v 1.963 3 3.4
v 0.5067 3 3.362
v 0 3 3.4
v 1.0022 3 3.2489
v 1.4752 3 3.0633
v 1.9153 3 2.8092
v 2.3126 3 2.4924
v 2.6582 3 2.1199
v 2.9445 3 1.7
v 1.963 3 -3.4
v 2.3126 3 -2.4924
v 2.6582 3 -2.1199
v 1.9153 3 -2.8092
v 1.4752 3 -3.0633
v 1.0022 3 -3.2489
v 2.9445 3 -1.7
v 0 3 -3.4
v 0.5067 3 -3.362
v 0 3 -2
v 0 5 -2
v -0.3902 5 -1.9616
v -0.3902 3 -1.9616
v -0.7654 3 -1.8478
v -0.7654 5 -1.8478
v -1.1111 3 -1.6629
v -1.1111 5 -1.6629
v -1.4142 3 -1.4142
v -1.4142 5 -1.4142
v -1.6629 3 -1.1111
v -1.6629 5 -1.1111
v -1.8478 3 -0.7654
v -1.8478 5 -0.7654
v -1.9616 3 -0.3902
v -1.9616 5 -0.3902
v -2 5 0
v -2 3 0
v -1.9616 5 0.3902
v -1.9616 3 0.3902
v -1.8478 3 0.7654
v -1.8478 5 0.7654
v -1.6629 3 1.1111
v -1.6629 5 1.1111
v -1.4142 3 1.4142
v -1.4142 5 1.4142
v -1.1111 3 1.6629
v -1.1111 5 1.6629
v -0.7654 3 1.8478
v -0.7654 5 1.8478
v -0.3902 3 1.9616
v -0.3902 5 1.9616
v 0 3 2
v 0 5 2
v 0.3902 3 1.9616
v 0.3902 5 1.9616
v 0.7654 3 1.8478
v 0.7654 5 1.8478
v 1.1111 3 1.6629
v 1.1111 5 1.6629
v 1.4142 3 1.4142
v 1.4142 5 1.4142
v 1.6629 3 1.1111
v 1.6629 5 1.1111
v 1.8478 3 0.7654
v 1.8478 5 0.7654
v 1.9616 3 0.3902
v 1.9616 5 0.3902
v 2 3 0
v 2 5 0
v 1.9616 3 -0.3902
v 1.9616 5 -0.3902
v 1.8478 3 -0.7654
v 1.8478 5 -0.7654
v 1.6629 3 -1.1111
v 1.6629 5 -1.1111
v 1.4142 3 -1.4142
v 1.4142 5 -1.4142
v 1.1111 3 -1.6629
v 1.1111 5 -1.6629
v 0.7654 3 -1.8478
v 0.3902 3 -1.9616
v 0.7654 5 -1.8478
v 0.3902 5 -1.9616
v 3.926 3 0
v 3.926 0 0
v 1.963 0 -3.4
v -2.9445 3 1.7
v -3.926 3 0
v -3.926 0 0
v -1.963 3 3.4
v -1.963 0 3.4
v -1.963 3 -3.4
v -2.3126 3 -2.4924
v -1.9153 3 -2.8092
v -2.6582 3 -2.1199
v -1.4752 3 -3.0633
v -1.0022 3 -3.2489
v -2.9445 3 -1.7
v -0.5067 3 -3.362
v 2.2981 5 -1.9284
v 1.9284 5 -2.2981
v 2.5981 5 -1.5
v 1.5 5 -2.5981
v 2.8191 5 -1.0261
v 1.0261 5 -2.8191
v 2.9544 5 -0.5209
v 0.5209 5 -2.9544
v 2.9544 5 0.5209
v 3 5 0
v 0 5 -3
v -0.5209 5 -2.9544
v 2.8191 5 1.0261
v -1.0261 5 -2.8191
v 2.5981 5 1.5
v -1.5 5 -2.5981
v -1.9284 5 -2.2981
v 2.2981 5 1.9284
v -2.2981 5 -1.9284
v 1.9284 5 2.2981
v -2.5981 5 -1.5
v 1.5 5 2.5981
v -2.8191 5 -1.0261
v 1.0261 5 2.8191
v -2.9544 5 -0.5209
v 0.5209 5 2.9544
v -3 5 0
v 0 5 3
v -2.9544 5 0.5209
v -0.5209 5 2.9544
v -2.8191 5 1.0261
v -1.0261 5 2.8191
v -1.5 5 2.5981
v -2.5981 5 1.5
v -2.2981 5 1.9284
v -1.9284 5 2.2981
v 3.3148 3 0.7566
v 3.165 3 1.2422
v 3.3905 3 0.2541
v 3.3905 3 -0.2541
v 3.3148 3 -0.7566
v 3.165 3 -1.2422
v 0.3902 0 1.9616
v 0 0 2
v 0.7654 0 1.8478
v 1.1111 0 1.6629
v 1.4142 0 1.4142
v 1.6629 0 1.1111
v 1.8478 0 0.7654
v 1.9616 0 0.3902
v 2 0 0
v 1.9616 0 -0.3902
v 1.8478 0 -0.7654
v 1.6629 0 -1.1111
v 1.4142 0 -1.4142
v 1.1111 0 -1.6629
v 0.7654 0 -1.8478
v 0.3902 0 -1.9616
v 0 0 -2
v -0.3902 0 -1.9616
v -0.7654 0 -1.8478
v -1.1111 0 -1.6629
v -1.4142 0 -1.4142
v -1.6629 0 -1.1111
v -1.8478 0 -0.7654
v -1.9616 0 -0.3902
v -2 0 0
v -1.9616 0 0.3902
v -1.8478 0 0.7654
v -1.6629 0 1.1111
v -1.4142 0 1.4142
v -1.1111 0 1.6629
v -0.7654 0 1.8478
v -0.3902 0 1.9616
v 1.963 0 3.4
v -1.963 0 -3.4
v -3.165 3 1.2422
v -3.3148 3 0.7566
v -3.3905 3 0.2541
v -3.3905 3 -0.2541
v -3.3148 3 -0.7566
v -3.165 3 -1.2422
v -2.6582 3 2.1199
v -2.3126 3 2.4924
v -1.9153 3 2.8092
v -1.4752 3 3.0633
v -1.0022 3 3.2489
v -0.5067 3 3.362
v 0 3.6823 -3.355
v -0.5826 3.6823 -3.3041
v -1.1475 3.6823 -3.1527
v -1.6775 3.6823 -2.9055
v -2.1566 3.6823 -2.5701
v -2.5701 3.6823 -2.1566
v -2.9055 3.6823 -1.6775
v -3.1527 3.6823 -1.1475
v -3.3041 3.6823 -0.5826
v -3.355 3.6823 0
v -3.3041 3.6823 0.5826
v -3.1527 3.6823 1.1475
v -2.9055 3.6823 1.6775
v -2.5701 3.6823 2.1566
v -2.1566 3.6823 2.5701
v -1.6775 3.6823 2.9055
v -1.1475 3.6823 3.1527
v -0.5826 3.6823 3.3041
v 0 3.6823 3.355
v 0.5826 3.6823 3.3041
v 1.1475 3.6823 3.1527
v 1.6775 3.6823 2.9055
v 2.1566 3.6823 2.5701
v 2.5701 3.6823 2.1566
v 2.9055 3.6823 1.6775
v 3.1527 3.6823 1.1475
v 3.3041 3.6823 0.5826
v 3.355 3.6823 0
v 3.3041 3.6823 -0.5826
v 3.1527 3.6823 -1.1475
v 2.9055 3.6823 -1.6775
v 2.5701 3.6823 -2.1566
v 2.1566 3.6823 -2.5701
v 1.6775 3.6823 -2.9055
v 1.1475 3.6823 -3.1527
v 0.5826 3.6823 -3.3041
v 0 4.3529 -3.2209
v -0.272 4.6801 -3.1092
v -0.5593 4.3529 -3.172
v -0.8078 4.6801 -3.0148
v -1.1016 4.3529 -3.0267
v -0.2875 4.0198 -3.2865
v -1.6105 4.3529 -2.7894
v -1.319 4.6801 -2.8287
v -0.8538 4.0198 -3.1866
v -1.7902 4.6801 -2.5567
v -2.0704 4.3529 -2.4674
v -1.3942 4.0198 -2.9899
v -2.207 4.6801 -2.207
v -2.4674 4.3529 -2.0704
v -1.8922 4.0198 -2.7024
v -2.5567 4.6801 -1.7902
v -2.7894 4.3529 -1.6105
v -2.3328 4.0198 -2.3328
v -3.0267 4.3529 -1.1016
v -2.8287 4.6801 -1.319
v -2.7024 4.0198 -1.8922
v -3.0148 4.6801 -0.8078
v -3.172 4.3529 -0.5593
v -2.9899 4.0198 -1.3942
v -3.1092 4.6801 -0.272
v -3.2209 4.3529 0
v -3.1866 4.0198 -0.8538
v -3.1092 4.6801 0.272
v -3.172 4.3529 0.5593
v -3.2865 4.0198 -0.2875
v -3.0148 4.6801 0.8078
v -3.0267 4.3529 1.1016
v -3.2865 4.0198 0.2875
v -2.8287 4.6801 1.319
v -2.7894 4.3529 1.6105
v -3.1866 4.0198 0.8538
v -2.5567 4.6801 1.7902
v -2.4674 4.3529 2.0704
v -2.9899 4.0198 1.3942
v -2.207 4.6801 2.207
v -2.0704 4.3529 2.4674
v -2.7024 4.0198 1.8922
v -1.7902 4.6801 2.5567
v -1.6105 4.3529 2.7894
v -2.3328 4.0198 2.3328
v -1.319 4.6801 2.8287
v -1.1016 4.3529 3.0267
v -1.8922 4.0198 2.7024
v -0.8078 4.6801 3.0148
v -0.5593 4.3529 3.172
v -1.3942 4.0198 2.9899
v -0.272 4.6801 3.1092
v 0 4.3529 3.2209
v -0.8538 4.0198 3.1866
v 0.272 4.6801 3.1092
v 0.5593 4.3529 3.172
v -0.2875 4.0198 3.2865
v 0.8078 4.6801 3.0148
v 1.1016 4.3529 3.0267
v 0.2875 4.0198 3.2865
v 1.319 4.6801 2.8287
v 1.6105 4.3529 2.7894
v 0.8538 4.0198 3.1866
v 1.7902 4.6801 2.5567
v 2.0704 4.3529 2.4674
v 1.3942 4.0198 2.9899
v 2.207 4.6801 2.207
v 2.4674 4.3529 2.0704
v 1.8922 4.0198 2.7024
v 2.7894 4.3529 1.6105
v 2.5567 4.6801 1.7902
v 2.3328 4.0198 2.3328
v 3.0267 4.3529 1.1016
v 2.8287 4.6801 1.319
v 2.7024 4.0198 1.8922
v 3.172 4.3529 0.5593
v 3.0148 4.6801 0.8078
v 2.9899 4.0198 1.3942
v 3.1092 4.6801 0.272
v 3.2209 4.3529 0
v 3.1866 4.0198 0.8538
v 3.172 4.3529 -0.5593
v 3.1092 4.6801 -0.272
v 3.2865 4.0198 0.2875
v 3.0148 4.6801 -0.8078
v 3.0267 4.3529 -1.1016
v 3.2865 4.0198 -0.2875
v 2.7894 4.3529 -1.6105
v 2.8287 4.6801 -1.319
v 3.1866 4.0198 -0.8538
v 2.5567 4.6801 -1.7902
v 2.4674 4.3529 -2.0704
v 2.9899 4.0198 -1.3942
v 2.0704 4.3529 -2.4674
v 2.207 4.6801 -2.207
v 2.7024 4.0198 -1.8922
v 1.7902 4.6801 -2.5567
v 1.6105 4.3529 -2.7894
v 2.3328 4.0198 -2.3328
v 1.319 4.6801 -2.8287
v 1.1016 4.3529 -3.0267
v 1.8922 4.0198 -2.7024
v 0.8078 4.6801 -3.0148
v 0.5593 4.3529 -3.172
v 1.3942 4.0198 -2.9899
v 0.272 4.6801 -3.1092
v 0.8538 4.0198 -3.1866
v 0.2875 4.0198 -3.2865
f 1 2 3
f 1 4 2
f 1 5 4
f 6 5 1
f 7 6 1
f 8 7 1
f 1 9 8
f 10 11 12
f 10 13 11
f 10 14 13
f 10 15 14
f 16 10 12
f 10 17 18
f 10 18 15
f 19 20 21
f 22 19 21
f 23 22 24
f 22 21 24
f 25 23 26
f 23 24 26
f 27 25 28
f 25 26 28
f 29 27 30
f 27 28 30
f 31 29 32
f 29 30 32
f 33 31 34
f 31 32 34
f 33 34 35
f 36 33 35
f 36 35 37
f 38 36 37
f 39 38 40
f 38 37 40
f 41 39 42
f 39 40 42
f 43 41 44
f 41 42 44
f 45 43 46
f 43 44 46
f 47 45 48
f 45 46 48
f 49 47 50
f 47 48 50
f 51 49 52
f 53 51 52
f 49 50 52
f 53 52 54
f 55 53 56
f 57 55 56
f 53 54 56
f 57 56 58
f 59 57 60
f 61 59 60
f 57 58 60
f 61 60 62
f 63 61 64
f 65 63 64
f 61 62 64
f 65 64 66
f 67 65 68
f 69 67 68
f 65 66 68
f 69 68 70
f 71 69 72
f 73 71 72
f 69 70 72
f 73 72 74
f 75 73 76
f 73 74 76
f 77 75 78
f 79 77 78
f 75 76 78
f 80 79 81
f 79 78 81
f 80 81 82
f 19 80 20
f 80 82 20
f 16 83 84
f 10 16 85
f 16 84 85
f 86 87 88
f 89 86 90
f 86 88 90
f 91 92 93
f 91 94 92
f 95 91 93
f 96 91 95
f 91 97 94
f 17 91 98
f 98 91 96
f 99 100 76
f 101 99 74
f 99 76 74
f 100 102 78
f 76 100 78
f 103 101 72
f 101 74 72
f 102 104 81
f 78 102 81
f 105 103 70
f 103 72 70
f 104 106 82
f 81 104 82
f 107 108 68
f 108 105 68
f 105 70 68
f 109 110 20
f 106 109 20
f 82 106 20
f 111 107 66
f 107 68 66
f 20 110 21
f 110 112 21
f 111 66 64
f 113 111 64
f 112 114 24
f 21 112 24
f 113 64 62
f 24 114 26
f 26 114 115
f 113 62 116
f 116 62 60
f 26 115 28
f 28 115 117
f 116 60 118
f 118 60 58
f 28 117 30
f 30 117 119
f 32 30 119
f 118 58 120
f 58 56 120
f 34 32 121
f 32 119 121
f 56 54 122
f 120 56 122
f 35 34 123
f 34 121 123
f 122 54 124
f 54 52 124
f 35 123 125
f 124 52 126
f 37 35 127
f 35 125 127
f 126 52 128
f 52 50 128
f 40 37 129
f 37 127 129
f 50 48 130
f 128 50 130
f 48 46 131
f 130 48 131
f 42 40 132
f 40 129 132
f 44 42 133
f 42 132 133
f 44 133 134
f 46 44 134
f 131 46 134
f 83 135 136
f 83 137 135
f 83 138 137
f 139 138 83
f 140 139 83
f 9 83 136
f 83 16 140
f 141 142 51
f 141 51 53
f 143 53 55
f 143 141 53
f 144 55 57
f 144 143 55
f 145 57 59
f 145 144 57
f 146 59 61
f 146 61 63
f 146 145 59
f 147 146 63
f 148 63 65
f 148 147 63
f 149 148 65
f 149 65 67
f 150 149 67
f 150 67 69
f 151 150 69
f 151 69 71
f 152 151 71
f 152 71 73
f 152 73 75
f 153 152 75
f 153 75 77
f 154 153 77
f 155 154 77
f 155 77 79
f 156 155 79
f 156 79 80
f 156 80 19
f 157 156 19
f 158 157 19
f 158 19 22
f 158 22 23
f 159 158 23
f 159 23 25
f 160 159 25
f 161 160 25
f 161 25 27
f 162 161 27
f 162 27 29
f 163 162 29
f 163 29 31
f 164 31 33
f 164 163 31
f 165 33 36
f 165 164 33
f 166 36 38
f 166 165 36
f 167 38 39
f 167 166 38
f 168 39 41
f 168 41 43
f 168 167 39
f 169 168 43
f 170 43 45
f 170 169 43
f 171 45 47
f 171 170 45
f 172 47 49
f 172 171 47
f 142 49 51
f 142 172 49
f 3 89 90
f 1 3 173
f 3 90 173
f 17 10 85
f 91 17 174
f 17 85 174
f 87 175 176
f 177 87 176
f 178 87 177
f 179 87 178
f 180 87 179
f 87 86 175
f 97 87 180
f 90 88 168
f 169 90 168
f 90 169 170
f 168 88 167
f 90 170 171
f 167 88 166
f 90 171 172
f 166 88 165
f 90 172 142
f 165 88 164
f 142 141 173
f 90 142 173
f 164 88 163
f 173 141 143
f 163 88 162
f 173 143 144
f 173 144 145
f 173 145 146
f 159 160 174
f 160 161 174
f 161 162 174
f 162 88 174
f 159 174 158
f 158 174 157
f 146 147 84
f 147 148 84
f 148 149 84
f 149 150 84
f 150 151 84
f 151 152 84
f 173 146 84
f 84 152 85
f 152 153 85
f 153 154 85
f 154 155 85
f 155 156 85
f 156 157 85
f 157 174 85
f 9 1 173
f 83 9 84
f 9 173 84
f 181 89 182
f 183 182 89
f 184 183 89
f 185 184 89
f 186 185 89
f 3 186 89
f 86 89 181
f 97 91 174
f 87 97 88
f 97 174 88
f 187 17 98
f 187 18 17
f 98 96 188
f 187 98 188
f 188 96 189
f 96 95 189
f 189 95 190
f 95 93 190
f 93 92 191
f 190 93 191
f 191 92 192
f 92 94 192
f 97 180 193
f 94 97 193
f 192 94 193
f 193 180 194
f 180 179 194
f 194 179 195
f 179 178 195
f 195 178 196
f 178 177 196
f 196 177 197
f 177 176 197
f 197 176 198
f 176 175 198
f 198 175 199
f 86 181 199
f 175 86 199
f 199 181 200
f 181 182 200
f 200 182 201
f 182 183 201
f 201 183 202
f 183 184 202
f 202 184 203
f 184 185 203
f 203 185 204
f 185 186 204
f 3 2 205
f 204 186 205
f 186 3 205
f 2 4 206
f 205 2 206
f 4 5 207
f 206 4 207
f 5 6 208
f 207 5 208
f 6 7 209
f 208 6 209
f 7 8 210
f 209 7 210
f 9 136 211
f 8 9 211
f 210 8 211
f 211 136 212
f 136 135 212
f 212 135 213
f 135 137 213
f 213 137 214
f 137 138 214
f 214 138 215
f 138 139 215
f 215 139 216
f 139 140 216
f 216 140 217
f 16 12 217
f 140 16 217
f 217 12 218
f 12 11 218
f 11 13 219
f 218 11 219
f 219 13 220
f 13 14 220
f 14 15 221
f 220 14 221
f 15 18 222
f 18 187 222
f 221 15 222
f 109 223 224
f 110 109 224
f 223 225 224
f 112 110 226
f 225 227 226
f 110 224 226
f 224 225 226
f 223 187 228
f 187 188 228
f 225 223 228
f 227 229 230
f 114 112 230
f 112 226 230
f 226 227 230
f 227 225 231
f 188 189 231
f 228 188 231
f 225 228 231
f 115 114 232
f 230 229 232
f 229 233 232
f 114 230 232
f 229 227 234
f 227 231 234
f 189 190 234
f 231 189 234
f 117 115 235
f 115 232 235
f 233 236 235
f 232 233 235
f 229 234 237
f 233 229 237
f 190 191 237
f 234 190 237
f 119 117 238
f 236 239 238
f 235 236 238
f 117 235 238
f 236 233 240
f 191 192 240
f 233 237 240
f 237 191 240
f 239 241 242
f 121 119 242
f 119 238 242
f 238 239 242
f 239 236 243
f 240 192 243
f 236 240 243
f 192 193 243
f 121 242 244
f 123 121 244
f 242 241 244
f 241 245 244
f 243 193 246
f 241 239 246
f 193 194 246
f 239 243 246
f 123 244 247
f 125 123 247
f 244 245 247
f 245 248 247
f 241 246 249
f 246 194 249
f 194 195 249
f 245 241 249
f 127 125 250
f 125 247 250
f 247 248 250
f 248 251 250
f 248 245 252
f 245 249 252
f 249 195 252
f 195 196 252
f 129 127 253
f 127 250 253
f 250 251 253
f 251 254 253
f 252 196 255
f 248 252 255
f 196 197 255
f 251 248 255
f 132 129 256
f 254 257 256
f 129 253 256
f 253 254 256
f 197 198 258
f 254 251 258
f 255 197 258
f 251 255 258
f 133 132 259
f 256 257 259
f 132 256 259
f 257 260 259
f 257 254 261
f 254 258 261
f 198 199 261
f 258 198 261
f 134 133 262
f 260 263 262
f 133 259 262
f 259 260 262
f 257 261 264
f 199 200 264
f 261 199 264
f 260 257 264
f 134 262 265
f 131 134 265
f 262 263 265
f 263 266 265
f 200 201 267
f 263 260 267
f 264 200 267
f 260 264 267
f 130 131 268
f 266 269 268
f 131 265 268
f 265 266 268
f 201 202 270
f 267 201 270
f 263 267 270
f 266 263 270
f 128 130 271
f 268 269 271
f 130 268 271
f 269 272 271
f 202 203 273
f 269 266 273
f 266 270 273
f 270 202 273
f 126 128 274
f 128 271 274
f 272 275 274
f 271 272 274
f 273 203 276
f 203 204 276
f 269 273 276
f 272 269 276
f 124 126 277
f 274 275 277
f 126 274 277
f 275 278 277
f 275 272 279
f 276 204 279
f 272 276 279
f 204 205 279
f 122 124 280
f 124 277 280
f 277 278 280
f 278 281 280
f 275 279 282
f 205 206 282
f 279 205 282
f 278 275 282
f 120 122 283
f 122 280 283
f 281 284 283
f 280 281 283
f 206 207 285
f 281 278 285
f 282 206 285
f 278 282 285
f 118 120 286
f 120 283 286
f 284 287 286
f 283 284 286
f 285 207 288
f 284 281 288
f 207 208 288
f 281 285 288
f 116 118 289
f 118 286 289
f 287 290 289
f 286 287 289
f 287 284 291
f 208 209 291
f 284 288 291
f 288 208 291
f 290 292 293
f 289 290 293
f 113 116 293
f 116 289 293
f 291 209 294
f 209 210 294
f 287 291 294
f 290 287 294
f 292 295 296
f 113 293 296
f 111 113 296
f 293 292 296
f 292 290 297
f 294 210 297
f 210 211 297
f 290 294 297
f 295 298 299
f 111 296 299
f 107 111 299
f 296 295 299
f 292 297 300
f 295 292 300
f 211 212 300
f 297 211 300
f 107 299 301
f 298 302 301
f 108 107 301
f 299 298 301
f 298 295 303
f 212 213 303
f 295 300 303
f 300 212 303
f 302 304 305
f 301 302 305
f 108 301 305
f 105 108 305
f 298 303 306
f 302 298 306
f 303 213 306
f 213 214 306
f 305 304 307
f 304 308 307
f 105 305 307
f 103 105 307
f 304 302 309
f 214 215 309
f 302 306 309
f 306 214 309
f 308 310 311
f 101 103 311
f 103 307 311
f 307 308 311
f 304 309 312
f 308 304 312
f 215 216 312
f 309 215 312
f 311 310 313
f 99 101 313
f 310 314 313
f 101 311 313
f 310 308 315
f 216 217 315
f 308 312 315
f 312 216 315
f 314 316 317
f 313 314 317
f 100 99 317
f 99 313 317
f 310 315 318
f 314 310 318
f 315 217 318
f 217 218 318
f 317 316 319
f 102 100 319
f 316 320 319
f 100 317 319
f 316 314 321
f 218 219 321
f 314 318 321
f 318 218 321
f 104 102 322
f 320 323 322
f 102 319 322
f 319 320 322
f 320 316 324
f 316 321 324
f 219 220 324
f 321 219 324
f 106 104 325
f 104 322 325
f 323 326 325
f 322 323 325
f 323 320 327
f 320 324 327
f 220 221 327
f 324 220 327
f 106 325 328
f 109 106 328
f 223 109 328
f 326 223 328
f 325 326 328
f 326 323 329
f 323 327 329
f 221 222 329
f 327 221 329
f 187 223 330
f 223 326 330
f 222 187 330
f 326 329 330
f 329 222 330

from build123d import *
from build123d.topology import SkipClean

# Parameters (mm, degrees)
SKETCH1_R           = 2
BOSS_EXTRUDE1_DEPTH = 3


with BuildPart() as part:
    # Sketch1 → Boss-Extrude1 (new body)
    with BuildSketch(Plane(origin=(0, 0, 0), x_dir=(1, 0, 0), z_dir=(0, 1, 0))):
        Polygon((-1.962990915, -3.4), (1.962990915, -3.4), (3.92598183, 0), (1.962990915, 3.4), (-1.962990915, 3.4), (-3.92598183, 0), align=None)
        Circle(SKETCH1_R, mode=Mode.SUBTRACT)
    extrude(amount=BOSS_EXTRUDE1_DEPTH)

    # Sketch2 → Revolve1 (revolve)
    with SkipClean():  # the faces are left unmerged after this step: merging them gives an invalid solid
        with BuildSketch(Plane(origin=(0, 0, 0), x_dir=(0, 0, -1), z_dir=(1, 0, 0))):
            with BuildLine():
                Line((-2, 3), (-2, 5))
                Line((-2, 5), (-3, 5))
                ThreePointArc((-3, 5), (-3.299019514, 4.019803903), (-3.4, 3))
                Line((-3.4, 3), (-2, 3))
            make_face()
        revolve(axis=Axis((0, 0, 0), (0, 1, 0)))
    add(part.part.scale(1), mode=Mode.REPLACE)  # the faces are merged on a copy


solid = part.part
